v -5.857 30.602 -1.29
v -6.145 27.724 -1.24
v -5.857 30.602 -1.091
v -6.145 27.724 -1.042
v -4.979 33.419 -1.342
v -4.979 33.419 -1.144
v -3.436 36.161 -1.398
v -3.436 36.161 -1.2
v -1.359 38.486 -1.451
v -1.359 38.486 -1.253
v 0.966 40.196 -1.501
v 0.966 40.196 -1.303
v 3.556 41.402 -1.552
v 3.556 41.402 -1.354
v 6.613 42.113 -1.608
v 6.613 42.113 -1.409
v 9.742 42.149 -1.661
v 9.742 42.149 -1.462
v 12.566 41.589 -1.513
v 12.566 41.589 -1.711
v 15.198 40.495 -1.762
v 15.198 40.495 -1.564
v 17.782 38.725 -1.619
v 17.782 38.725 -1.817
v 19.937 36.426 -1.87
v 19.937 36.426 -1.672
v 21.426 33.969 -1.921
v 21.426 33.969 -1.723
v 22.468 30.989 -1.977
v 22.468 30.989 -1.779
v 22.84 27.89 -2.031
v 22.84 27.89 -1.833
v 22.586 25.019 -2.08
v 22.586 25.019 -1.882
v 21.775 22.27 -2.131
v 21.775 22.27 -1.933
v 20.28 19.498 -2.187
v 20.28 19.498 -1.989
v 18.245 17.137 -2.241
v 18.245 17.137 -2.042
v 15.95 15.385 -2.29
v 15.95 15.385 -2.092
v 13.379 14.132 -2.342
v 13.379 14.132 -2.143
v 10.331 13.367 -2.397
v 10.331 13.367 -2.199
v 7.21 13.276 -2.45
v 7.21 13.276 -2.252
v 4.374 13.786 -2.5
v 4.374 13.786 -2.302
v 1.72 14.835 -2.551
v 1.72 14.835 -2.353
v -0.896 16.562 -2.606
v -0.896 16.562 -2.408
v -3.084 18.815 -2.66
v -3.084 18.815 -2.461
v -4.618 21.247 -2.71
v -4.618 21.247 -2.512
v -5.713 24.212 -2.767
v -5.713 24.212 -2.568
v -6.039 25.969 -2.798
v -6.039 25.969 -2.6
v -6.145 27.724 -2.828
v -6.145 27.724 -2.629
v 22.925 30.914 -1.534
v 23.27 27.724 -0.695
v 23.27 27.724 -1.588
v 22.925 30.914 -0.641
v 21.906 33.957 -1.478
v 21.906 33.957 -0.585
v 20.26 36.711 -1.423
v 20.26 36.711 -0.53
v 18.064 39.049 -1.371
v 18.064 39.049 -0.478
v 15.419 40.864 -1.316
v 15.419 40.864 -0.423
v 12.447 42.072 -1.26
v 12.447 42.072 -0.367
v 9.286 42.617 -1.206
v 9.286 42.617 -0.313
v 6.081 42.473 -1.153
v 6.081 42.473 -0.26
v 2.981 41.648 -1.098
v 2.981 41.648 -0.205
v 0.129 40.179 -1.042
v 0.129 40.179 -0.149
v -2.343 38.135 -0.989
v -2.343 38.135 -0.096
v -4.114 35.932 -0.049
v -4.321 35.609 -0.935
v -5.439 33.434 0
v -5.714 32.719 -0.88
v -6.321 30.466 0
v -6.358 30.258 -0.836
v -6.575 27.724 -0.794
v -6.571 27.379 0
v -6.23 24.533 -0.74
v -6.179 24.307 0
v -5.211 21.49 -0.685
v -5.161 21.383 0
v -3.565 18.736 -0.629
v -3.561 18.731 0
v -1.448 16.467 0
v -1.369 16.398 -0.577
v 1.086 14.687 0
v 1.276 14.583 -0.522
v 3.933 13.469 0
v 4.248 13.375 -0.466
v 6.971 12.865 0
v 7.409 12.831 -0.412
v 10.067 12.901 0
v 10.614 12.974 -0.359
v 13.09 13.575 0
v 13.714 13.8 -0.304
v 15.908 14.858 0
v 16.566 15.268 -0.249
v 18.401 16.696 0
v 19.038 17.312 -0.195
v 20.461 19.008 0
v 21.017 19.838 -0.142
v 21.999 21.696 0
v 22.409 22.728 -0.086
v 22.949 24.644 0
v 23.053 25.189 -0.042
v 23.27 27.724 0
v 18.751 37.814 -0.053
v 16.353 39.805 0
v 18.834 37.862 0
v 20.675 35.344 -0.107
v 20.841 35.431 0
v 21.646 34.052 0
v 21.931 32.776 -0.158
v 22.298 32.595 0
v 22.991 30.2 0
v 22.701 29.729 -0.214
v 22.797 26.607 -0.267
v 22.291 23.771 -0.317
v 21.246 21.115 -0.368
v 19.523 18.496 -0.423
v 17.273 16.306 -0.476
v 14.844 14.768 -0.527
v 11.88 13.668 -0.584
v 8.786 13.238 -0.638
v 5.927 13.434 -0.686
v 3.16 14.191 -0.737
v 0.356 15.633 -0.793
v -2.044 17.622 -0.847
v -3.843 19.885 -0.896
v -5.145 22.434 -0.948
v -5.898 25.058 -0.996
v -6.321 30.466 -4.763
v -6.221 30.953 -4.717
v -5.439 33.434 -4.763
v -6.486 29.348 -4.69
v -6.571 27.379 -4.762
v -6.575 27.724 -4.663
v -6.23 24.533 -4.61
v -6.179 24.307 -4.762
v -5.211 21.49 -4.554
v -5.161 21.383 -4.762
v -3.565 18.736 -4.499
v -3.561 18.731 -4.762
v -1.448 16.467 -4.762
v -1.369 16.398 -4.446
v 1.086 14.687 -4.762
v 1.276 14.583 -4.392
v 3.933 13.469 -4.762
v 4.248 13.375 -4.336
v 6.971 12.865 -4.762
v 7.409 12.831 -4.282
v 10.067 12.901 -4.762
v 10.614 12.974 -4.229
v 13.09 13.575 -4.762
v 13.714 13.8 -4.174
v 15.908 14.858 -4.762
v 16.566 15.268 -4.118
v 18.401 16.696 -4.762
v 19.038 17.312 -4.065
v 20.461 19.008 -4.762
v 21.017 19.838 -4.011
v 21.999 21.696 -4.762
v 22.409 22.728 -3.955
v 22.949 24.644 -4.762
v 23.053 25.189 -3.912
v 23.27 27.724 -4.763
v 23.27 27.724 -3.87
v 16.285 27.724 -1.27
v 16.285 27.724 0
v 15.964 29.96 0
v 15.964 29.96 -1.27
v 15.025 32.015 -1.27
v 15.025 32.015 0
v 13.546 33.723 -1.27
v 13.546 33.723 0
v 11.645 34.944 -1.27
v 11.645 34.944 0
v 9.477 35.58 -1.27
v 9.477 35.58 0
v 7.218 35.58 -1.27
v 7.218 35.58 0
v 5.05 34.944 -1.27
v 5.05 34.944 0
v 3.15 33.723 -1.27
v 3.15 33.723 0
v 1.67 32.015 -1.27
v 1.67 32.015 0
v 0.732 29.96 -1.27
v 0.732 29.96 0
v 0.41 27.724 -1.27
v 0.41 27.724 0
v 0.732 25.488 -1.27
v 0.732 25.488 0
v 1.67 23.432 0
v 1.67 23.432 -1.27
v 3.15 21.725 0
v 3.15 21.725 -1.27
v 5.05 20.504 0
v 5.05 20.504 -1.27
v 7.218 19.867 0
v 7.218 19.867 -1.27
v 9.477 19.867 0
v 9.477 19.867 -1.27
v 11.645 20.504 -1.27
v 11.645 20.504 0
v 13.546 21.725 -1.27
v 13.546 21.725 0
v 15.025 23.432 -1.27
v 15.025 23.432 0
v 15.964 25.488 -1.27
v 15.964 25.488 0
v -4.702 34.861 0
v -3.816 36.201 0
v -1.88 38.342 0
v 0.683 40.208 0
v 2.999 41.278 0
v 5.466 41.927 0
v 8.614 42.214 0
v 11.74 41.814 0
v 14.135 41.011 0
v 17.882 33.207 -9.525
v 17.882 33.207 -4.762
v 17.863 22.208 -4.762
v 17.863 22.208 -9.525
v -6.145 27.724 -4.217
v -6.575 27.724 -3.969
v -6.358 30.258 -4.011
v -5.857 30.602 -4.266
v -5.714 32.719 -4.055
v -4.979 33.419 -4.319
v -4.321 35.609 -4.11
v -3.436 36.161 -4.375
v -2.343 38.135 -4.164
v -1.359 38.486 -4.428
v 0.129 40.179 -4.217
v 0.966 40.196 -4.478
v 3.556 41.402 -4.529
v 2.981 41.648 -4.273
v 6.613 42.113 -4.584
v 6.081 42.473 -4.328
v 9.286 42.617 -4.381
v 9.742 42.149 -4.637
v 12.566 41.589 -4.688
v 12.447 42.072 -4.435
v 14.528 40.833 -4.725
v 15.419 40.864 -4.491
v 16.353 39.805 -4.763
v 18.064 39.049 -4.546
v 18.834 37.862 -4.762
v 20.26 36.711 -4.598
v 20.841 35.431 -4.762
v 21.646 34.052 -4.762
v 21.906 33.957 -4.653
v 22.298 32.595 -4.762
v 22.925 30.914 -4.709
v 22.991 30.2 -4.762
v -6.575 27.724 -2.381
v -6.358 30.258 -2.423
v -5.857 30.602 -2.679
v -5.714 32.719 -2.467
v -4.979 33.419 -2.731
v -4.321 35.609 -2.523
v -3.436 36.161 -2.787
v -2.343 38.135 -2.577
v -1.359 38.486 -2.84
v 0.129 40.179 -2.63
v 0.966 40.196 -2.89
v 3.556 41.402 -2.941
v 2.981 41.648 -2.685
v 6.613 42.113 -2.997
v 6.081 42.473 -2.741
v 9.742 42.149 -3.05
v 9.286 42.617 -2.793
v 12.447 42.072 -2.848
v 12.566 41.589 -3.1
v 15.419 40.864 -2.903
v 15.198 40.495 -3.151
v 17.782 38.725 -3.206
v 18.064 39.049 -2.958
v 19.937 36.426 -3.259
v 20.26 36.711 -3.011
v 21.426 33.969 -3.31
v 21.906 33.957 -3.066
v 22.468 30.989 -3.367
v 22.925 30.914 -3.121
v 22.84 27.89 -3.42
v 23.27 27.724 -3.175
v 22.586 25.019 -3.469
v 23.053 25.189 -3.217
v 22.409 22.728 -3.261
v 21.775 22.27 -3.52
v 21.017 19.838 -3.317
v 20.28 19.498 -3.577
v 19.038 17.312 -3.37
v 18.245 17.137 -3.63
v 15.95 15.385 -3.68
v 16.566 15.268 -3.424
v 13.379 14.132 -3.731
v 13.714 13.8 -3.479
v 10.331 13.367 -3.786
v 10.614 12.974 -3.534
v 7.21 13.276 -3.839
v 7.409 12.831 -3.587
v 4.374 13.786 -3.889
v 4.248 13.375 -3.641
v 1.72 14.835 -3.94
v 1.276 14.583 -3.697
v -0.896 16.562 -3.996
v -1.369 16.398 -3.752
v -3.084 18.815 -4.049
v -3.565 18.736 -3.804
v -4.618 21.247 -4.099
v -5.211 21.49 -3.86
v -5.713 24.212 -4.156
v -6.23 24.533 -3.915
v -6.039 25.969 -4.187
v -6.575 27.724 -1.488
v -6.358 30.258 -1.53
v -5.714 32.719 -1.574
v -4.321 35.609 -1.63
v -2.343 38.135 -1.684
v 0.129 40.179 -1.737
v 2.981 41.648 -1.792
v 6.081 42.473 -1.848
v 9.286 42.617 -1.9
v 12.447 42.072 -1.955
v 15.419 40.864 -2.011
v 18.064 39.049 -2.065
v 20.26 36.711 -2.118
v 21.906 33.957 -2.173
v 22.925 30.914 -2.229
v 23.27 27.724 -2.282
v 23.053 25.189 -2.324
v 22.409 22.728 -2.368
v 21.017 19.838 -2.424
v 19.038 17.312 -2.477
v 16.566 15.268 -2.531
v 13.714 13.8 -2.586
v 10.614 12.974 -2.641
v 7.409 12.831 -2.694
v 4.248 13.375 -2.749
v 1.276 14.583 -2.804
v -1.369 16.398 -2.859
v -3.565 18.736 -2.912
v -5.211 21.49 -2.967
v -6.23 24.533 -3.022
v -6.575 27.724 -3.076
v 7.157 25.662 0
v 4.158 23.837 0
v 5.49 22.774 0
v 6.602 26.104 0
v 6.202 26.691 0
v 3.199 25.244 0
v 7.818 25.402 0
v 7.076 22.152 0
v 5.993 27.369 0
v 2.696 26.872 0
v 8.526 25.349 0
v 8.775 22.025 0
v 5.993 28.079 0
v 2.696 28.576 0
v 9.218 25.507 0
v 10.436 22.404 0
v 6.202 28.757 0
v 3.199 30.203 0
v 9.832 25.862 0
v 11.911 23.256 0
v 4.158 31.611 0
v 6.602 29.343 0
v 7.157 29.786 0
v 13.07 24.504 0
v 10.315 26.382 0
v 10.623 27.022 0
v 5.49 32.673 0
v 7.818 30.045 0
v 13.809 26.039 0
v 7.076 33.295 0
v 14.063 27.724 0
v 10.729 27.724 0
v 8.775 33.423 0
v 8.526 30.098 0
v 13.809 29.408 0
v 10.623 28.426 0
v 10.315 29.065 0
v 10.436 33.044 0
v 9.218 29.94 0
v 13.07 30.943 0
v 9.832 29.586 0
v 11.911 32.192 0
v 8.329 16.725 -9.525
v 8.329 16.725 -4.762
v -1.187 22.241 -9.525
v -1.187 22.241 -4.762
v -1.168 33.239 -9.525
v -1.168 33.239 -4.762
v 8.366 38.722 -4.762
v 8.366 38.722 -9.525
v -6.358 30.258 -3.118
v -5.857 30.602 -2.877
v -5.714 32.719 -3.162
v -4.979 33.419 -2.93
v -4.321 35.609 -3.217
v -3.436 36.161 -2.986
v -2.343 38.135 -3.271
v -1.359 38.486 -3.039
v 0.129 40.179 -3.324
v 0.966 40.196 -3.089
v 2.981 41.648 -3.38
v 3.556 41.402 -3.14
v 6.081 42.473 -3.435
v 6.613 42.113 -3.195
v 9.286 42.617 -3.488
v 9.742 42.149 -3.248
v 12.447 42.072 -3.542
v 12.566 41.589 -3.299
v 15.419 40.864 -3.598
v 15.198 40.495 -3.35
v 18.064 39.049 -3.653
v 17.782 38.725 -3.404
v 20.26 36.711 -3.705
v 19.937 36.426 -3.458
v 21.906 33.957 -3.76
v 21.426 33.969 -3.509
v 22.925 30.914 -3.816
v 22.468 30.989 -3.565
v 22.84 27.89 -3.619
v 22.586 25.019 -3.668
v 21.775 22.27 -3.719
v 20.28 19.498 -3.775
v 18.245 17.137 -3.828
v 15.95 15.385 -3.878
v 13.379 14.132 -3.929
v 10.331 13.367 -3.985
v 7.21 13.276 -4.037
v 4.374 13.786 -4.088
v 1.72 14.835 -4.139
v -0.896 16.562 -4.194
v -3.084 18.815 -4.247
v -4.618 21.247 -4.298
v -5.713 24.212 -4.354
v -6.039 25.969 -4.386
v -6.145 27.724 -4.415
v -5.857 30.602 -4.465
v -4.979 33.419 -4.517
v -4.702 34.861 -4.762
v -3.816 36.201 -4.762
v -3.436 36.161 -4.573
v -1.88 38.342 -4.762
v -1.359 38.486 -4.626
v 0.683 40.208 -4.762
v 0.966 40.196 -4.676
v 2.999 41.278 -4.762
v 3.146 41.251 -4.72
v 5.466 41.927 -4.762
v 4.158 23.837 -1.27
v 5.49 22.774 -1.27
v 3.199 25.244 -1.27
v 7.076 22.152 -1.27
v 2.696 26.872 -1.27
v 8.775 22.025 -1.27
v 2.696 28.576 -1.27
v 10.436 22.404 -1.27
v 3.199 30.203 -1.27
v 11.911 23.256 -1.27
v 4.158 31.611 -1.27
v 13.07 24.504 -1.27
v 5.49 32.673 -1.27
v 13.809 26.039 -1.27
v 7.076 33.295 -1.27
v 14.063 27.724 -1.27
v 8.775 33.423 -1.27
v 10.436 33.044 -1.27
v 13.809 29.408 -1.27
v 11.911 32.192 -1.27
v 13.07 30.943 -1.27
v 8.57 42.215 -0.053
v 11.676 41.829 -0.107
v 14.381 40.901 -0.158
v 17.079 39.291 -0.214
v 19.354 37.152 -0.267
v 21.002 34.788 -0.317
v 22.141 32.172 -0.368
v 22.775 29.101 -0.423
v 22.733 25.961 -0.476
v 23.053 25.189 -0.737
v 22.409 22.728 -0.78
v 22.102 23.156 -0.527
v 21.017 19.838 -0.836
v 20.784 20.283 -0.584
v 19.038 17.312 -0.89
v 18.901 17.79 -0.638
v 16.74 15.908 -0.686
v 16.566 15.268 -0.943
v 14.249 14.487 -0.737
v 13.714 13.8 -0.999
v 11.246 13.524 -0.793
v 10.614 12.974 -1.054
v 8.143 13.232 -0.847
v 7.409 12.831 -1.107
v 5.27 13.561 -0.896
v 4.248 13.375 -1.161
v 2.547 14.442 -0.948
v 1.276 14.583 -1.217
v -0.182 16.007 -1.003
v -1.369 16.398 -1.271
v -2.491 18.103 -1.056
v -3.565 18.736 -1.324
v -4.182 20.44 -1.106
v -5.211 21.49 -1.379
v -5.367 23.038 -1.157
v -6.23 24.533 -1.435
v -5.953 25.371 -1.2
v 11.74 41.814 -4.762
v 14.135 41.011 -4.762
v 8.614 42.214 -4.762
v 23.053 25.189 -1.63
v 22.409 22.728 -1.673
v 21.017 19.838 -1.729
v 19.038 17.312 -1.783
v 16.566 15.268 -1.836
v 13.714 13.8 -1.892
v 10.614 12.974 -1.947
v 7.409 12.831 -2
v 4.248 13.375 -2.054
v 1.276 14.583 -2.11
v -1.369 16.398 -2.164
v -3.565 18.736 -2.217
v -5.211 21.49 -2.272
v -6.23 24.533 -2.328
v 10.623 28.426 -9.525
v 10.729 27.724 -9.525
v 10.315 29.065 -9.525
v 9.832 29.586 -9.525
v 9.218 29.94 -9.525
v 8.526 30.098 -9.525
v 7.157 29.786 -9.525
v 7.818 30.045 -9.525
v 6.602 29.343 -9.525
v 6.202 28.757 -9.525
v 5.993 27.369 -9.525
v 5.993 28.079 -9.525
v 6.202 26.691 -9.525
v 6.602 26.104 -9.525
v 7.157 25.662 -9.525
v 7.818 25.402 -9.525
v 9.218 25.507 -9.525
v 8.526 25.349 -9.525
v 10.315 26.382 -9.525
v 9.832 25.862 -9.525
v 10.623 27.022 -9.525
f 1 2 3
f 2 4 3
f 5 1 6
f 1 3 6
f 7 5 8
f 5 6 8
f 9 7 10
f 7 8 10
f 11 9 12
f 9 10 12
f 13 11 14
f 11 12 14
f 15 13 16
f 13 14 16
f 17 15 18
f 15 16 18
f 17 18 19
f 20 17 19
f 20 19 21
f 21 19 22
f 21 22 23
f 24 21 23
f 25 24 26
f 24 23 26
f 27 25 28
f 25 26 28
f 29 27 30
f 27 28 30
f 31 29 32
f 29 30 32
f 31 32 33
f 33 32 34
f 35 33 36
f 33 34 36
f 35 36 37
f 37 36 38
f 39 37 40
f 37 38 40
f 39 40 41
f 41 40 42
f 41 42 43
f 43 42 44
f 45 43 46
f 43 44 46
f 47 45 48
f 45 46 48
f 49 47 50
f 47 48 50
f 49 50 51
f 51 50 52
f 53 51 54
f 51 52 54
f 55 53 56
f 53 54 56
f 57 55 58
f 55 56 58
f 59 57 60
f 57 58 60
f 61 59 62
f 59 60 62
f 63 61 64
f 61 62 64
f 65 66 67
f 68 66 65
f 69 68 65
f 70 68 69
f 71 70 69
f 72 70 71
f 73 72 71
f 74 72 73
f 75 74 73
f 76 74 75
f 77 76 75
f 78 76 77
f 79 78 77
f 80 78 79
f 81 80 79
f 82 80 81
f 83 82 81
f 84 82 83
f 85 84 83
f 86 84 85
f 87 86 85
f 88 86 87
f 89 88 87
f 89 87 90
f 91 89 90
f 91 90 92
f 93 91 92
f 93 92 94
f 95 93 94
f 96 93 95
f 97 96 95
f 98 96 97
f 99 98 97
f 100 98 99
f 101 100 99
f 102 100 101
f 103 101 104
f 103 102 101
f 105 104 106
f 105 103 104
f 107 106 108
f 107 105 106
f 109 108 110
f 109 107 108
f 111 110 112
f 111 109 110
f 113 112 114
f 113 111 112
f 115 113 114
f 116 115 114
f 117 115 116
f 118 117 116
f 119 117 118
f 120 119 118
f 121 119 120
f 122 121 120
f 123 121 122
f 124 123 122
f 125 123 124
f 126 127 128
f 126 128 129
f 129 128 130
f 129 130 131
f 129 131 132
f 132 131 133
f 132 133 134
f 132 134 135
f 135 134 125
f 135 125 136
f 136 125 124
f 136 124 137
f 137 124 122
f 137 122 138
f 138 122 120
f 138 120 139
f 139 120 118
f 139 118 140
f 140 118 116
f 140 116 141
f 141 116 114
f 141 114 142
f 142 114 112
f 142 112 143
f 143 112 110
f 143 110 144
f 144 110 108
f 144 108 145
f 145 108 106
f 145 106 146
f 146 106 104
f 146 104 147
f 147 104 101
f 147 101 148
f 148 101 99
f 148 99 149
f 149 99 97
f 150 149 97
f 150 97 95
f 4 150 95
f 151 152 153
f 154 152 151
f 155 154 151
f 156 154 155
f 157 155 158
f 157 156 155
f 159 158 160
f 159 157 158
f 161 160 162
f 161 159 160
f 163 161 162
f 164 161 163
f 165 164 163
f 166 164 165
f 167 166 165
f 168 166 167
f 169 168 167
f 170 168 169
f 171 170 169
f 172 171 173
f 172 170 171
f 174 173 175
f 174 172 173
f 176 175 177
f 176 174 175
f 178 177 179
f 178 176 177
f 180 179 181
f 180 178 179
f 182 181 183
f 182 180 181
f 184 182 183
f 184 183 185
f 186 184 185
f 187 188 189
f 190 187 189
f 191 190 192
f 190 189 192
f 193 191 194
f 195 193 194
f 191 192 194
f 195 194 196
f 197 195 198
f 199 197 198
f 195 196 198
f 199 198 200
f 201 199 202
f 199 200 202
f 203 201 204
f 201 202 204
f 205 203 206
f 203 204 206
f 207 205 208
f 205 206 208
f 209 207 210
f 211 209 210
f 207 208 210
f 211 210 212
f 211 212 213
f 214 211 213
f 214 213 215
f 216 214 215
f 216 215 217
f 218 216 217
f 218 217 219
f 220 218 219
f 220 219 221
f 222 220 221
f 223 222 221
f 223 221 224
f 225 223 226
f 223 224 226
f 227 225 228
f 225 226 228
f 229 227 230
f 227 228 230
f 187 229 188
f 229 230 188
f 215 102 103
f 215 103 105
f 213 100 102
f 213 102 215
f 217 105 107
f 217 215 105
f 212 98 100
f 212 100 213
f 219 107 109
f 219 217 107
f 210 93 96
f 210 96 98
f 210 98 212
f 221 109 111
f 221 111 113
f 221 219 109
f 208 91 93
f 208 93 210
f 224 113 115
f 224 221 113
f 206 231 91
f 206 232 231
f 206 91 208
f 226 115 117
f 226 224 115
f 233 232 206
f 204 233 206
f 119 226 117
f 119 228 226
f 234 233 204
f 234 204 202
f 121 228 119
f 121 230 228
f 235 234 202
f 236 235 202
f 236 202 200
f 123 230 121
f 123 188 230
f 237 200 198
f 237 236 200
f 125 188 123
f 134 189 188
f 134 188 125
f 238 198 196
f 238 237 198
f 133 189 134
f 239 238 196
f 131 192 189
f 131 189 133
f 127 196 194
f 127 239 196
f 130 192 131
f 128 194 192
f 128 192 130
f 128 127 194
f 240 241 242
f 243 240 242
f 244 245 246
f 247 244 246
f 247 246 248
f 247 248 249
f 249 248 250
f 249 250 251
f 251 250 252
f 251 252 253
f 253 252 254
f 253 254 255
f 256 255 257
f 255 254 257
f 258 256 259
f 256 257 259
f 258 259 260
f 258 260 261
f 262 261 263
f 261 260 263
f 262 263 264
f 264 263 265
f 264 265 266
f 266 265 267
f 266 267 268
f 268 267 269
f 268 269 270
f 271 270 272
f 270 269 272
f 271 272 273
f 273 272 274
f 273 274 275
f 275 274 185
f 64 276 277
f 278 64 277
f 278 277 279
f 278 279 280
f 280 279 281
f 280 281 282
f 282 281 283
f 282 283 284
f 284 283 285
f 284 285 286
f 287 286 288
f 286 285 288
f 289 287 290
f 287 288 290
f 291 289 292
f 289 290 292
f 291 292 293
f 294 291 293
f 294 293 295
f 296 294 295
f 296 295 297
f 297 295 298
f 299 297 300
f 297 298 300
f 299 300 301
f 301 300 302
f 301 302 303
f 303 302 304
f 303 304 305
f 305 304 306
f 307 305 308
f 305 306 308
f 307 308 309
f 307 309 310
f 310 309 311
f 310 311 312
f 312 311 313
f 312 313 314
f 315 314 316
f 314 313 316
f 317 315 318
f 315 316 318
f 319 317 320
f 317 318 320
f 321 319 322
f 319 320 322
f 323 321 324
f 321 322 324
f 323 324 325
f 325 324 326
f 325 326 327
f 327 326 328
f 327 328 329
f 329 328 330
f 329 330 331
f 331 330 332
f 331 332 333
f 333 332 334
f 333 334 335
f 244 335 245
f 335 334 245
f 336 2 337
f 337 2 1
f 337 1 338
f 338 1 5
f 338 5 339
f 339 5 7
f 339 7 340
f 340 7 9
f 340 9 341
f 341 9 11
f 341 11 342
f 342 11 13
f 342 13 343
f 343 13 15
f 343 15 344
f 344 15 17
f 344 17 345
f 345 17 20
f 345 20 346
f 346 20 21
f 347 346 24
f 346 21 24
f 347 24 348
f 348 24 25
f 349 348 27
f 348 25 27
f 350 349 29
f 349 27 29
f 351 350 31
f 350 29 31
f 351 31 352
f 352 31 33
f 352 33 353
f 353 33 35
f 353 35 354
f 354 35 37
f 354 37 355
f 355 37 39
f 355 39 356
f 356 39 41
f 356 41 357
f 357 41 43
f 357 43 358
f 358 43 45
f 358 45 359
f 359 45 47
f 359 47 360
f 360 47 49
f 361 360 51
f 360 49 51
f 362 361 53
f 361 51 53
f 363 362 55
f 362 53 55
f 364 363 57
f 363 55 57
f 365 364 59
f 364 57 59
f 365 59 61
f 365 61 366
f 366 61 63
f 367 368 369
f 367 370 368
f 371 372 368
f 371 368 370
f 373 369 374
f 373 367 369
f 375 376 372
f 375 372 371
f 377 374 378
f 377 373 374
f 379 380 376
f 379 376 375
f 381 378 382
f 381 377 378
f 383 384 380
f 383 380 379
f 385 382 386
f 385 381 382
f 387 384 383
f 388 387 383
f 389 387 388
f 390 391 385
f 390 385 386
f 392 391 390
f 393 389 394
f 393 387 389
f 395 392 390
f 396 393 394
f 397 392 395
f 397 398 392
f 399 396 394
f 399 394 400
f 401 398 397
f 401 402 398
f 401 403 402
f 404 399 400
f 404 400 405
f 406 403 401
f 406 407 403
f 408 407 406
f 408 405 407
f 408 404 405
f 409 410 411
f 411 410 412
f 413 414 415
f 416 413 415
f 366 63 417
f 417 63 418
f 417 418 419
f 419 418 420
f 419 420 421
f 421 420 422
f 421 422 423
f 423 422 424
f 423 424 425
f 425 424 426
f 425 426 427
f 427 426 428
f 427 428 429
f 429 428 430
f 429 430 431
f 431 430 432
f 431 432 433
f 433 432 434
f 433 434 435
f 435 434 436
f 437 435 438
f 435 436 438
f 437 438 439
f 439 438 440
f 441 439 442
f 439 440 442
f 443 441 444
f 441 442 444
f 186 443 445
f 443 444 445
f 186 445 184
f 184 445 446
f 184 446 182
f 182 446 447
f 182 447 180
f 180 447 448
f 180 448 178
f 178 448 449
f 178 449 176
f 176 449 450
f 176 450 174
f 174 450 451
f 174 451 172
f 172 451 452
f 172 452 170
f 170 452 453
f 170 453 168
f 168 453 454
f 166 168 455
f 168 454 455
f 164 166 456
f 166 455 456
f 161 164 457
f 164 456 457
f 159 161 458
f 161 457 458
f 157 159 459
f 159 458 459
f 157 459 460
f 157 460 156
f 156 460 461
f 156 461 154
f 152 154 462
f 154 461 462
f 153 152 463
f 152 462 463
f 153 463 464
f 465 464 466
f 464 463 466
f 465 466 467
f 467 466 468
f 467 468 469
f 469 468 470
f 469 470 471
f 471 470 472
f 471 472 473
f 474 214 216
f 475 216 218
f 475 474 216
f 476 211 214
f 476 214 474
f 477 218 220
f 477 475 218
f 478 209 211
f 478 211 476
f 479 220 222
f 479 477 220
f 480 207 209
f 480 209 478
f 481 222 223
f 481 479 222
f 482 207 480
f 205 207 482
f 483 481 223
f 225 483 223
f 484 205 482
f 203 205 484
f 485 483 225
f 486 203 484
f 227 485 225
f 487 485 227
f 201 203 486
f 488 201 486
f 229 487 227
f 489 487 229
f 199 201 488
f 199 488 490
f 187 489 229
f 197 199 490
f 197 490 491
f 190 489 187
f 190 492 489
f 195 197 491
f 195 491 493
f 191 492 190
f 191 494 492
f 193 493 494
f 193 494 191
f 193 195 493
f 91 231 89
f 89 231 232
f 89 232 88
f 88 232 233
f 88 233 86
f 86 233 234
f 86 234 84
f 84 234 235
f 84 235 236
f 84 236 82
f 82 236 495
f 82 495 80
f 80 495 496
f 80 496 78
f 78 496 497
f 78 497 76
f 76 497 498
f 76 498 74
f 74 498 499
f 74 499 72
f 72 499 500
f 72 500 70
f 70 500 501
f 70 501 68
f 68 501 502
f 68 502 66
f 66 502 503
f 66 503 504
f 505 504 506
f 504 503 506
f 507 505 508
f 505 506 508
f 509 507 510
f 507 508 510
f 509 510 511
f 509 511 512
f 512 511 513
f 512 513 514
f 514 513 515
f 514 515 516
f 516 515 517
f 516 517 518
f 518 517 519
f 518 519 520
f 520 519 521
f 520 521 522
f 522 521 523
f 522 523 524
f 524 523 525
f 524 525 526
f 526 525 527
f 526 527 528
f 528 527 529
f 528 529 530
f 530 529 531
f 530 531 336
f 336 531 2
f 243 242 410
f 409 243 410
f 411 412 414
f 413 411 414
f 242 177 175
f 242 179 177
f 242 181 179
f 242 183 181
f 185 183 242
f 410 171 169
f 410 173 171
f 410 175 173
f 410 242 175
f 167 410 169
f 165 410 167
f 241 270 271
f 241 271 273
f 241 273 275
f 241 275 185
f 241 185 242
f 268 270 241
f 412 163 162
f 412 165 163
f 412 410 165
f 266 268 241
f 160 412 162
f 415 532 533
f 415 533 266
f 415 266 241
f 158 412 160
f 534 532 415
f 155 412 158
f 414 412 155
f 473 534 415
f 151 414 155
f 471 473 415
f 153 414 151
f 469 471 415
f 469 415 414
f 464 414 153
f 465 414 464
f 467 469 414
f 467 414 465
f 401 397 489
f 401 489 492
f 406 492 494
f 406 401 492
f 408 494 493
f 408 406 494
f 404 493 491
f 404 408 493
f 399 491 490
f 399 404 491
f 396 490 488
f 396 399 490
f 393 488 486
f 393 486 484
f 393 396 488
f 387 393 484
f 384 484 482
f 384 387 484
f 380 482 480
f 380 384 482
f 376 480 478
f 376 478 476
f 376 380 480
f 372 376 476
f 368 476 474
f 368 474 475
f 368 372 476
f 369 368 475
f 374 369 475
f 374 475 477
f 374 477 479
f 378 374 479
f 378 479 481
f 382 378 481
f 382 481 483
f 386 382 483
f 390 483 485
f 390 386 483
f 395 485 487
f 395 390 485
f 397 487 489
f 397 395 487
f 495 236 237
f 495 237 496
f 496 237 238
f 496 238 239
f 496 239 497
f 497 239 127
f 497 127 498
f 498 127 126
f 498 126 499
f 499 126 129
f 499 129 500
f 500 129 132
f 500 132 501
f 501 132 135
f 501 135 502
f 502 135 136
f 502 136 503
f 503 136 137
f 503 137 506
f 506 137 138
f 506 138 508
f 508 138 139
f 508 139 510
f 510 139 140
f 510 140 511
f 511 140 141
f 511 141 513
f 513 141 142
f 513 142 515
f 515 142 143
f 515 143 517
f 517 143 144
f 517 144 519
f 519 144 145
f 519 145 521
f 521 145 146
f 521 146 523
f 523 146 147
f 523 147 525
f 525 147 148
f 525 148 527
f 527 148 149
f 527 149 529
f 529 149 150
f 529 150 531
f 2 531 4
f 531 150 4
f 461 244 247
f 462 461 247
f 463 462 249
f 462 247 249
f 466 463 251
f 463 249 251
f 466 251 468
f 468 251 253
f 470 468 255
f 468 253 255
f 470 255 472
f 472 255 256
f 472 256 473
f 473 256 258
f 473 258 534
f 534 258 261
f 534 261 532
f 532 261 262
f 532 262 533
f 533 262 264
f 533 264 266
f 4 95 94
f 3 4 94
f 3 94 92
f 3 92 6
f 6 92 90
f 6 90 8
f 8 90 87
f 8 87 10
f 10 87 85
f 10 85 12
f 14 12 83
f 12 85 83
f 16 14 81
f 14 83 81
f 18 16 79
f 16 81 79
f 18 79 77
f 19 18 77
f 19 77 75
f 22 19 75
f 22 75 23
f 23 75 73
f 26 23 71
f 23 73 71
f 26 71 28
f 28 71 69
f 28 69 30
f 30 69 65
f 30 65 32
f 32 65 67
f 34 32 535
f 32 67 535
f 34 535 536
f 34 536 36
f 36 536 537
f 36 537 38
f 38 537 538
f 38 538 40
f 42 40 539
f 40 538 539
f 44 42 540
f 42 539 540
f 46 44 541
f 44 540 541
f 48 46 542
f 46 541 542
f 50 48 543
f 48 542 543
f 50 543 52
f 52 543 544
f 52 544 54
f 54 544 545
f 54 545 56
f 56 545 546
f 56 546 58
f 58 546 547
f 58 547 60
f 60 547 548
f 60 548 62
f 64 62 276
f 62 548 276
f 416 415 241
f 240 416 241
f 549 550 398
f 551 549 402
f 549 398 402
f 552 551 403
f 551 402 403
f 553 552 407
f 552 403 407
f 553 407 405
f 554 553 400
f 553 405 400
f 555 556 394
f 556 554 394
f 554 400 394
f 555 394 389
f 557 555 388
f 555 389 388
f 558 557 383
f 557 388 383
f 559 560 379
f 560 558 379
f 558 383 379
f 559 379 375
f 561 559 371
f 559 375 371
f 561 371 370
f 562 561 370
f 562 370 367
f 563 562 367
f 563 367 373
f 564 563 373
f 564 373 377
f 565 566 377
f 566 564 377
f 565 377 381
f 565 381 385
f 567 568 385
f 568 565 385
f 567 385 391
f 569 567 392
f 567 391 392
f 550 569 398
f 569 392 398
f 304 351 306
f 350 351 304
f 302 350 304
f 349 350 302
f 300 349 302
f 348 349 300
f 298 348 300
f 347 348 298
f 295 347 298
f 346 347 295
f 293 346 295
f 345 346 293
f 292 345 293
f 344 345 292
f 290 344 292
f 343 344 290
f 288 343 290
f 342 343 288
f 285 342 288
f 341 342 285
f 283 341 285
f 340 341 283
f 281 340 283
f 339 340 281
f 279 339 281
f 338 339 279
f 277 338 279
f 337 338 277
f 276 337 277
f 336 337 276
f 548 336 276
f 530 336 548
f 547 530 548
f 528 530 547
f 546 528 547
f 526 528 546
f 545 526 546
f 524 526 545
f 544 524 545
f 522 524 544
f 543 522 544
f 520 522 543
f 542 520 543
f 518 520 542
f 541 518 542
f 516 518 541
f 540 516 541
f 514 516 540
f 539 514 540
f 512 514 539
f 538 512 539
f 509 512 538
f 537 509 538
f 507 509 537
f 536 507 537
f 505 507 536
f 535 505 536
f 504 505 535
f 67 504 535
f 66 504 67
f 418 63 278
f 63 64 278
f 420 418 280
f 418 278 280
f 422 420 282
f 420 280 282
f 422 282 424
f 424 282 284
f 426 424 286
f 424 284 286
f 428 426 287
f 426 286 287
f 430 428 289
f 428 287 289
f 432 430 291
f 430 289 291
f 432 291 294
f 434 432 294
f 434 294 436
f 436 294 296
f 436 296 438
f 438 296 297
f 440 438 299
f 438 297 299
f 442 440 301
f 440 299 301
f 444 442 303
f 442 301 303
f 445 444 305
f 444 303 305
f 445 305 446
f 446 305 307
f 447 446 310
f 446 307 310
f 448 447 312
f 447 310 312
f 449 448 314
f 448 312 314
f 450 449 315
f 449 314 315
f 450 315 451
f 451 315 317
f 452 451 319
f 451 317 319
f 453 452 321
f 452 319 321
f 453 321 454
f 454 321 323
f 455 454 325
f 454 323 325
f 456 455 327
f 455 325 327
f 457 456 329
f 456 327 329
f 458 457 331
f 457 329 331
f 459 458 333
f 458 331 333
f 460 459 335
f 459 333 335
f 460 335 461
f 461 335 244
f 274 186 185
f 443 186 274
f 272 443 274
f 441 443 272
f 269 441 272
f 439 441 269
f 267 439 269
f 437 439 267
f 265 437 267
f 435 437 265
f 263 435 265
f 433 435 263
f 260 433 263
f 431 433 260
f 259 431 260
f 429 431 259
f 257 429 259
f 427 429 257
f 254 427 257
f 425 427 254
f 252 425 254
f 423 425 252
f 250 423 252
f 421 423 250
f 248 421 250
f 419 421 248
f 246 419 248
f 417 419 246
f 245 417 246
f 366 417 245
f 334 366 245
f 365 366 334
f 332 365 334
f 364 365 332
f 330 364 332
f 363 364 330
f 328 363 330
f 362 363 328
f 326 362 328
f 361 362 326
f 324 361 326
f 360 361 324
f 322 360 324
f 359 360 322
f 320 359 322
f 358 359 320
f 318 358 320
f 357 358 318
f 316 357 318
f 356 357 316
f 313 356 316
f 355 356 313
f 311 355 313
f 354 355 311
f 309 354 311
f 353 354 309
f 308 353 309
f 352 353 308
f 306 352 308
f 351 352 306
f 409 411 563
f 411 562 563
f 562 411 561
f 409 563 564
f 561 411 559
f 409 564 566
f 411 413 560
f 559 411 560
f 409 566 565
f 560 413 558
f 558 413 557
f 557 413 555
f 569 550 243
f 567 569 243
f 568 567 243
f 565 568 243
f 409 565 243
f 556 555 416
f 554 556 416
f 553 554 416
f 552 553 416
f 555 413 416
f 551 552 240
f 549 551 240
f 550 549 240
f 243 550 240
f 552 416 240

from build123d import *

# Parameters (mm, degrees)
SKETCH3_R           = 14.9225
BOSS_EXTRUDE1_DEPTH = 9.525
SKETCH11_R          = 2.38125
CUT_EXTRUDE3_DEPTH  = 6.35
SKETCH12_R          = 7.9375
SKETCH12_R_2        = 5.715
CUT_EXTRUDE4_DEPTH  = 1.27
THREAD1_PITCH       = 1.5875
CUT_EXTRUDE5_START  = -6.35
SKETCH13_R          = 2.38125
CUT_EXTRUDE5_DEPTH  = 6.35
CUT_EXTRUDE6_START  = -4.7625
SKETCH14_R          = 14.9225
CUT_EXTRUDE6_DEPTH  = 4.7625


with BuildPart() as part:
    # Sketch3 → Boss-Extrude1 (new body)
    with BuildSketch(Plane.XY):
        with Locations((8.347593151, 27.723781851)):
            Circle(SKETCH3_R)
    extrude(amount=-BOSS_EXTRUDE1_DEPTH)

    # Sketch11 → Cut-Extrude3 (cut)
    with BuildSketch(Plane.XY):
        with Locations((8.347593151, 27.723781851)):
            Circle(SKETCH11_R)
    extrude(amount=-CUT_EXTRUDE3_DEPTH, mode=Mode.SUBTRACT)

    # Sketch12 → Cut-Extrude4 (cut)
    with BuildSketch(Plane.XY):
        with Locations((8.347593151, 27.723781851)):
            Circle(SKETCH12_R)
        with Locations((8.347593151, 27.723781851)):
            Circle(SKETCH12_R_2, mode=Mode.SUBTRACT)
    extrude(amount=-CUT_EXTRUDE4_DEPTH, mode=Mode.SUBTRACT)

    # Thread1: the profile of Thread Profile1 profile screwed along a right-hand helix of 4.8 turns, 8 arcs to a turn; built about Z, then put on its axis
    thread1_z = Axis((0, 0, 0), (0, 0, 1))
    thread1_corners = [(14.9228, 0, -0.000173205), (14.9228, 0, 0.694704453), (14.492870212, 0, 0.446484374), (14.492870212, 0, 0.248046874)]
    with BuildLine(mode=Mode.PRIVATE) as thread1_profile:
        Line(thread1_corners[0], thread1_corners[1])
        Line(thread1_corners[1], thread1_corners[2])
        Line(thread1_corners[2], thread1_corners[3])
        Line(thread1_corners[3], thread1_corners[0])
    thread1_cap = Face(thread1_profile.wire())
    thread1_turn_angles = [0, 22.5, 45, 67.5, 90, 112.5, 135, 157.5, 180, 202.5, 225, 247.5, 270, 292.5, 315, 337.5, 360]
    thread1_turn_weights = [1, 0.9238795325112867, 1, 0.9238795325112867, 1, 0.9238795325112867, 1, 0.9238795325112867, 1, 0.9238795325112867, 1, 0.9238795325112867, 1, 0.9238795325112867, 1, 0.9238795325112867, 1]
    thread1_turn_rails = [Edge.make_bspline([Vector(p[0], p[1], 0).rotate(thread1_z, thread1_turn_angles[k]) / thread1_turn_weights[k] + Vector(0, 0, p[2] + THREAD1_PITCH * thread1_turn_angles[k] / 360) for k in range(17)], [0, 0, 0, 1, 1, 2, 2, 3, 3, 4, 4, 5, 5, 6, 6, 7, 7, 8, 8, 8], 2, thread1_turn_weights) for p in thread1_corners]
    thread1_turn_sides = [Face.make_surface_from_curves(thread1_turn_rails[p[0]], thread1_turn_rails[p[1]]) for p in [(0, 1), (1, 2), (2, 3), (3, 0)]]
    thread1_last_angles = [1440, 1462.5, 1485, 1507.5, 1530, 1552.5, 1575, 1597.5, 1620, 1642.5, 1665, 1687.5, 1710, 1719, 1728]
    thread1_last_weights = [1, 0.9238795325112867, 1, 0.9238795325112867, 1, 0.9238795325112867, 1, 0.9238795325112867, 1, 0.9238795325112867, 1, 0.9238795325112867, 1, 0.9876883405951378, 1]
    thread1_last_rails = [Edge.make_bspline([Vector(p[0], p[1], 0).rotate(thread1_z, thread1_last_angles[k]) / thread1_last_weights[k] + Vector(0, 0, p[2] + THREAD1_PITCH * thread1_last_angles[k] / 360) for k in range(15)], [0, 0, 0, 1, 1, 2, 2, 3, 3, 4, 4, 5, 5, 6, 6, 7, 7, 7], 2, thread1_last_weights) for p in thread1_corners]
    thread1_last_sides = [Face.make_surface_from_curves(thread1_last_rails[p[0]], thread1_last_rails[p[1]]) for p in [(0, 1), (1, 2), (2, 3), (3, 0)]]
    thread1 = Plane(origin=(8.347593151, 27.723781851, 0.79375), x_dir=(-1, 0, 0), z_dir=(0, 0, -1)) * Solid(Shell([*[p.moved(Location((0, 0, THREAD1_PITCH * i))) for i in range(4) for p in thread1_turn_sides], *thread1_last_sides, thread1_cap, thread1_cap.rotate(thread1_z, 1728).moved(Location((0, 0, THREAD1_PITCH * 1728 / 360)))]))
    add(thread1, mode=Mode.SUBTRACT)

    # Sketch13 → Cut-Extrude5 (cut)
    with BuildSketch(Plane(origin=(0, 0, -9.525), x_dir=(-1, 0, 0), z_dir=(0, 0, -1)).offset(CUT_EXTRUDE5_START)):
        with Locations(Location((-8.347593151, 27.723781851, 0), (0, 0, 180))):
            Circle(SKETCH13_R)
    extrude(amount=CUT_EXTRUDE5_DEPTH, mode=Mode.SUBTRACT)

    # Sketch14 → Cut-Extrude6 (cut)
    with BuildSketch(Plane(origin=(0, 0, -9.525), x_dir=(-1, 0, 0), z_dir=(0, 0, -1)).offset(CUT_EXTRUDE6_START)):
        with Locations((-8.347593151, 27.723781851)):
            Circle(SKETCH14_R)
        Polygon((1.186658464, 22.240576024), (1.168128197, 33.239083042), (-8.366123418, 38.722288869), (-17.881844766, 33.206987678), (-17.863314499, 22.20848066), (-8.329062884, 16.725274833), align=None, mode=Mode.SUBTRACT)
    extrude(amount=CUT_EXTRUDE6_DEPTH, mode=Mode.SUBTRACT)


solid = part.part
